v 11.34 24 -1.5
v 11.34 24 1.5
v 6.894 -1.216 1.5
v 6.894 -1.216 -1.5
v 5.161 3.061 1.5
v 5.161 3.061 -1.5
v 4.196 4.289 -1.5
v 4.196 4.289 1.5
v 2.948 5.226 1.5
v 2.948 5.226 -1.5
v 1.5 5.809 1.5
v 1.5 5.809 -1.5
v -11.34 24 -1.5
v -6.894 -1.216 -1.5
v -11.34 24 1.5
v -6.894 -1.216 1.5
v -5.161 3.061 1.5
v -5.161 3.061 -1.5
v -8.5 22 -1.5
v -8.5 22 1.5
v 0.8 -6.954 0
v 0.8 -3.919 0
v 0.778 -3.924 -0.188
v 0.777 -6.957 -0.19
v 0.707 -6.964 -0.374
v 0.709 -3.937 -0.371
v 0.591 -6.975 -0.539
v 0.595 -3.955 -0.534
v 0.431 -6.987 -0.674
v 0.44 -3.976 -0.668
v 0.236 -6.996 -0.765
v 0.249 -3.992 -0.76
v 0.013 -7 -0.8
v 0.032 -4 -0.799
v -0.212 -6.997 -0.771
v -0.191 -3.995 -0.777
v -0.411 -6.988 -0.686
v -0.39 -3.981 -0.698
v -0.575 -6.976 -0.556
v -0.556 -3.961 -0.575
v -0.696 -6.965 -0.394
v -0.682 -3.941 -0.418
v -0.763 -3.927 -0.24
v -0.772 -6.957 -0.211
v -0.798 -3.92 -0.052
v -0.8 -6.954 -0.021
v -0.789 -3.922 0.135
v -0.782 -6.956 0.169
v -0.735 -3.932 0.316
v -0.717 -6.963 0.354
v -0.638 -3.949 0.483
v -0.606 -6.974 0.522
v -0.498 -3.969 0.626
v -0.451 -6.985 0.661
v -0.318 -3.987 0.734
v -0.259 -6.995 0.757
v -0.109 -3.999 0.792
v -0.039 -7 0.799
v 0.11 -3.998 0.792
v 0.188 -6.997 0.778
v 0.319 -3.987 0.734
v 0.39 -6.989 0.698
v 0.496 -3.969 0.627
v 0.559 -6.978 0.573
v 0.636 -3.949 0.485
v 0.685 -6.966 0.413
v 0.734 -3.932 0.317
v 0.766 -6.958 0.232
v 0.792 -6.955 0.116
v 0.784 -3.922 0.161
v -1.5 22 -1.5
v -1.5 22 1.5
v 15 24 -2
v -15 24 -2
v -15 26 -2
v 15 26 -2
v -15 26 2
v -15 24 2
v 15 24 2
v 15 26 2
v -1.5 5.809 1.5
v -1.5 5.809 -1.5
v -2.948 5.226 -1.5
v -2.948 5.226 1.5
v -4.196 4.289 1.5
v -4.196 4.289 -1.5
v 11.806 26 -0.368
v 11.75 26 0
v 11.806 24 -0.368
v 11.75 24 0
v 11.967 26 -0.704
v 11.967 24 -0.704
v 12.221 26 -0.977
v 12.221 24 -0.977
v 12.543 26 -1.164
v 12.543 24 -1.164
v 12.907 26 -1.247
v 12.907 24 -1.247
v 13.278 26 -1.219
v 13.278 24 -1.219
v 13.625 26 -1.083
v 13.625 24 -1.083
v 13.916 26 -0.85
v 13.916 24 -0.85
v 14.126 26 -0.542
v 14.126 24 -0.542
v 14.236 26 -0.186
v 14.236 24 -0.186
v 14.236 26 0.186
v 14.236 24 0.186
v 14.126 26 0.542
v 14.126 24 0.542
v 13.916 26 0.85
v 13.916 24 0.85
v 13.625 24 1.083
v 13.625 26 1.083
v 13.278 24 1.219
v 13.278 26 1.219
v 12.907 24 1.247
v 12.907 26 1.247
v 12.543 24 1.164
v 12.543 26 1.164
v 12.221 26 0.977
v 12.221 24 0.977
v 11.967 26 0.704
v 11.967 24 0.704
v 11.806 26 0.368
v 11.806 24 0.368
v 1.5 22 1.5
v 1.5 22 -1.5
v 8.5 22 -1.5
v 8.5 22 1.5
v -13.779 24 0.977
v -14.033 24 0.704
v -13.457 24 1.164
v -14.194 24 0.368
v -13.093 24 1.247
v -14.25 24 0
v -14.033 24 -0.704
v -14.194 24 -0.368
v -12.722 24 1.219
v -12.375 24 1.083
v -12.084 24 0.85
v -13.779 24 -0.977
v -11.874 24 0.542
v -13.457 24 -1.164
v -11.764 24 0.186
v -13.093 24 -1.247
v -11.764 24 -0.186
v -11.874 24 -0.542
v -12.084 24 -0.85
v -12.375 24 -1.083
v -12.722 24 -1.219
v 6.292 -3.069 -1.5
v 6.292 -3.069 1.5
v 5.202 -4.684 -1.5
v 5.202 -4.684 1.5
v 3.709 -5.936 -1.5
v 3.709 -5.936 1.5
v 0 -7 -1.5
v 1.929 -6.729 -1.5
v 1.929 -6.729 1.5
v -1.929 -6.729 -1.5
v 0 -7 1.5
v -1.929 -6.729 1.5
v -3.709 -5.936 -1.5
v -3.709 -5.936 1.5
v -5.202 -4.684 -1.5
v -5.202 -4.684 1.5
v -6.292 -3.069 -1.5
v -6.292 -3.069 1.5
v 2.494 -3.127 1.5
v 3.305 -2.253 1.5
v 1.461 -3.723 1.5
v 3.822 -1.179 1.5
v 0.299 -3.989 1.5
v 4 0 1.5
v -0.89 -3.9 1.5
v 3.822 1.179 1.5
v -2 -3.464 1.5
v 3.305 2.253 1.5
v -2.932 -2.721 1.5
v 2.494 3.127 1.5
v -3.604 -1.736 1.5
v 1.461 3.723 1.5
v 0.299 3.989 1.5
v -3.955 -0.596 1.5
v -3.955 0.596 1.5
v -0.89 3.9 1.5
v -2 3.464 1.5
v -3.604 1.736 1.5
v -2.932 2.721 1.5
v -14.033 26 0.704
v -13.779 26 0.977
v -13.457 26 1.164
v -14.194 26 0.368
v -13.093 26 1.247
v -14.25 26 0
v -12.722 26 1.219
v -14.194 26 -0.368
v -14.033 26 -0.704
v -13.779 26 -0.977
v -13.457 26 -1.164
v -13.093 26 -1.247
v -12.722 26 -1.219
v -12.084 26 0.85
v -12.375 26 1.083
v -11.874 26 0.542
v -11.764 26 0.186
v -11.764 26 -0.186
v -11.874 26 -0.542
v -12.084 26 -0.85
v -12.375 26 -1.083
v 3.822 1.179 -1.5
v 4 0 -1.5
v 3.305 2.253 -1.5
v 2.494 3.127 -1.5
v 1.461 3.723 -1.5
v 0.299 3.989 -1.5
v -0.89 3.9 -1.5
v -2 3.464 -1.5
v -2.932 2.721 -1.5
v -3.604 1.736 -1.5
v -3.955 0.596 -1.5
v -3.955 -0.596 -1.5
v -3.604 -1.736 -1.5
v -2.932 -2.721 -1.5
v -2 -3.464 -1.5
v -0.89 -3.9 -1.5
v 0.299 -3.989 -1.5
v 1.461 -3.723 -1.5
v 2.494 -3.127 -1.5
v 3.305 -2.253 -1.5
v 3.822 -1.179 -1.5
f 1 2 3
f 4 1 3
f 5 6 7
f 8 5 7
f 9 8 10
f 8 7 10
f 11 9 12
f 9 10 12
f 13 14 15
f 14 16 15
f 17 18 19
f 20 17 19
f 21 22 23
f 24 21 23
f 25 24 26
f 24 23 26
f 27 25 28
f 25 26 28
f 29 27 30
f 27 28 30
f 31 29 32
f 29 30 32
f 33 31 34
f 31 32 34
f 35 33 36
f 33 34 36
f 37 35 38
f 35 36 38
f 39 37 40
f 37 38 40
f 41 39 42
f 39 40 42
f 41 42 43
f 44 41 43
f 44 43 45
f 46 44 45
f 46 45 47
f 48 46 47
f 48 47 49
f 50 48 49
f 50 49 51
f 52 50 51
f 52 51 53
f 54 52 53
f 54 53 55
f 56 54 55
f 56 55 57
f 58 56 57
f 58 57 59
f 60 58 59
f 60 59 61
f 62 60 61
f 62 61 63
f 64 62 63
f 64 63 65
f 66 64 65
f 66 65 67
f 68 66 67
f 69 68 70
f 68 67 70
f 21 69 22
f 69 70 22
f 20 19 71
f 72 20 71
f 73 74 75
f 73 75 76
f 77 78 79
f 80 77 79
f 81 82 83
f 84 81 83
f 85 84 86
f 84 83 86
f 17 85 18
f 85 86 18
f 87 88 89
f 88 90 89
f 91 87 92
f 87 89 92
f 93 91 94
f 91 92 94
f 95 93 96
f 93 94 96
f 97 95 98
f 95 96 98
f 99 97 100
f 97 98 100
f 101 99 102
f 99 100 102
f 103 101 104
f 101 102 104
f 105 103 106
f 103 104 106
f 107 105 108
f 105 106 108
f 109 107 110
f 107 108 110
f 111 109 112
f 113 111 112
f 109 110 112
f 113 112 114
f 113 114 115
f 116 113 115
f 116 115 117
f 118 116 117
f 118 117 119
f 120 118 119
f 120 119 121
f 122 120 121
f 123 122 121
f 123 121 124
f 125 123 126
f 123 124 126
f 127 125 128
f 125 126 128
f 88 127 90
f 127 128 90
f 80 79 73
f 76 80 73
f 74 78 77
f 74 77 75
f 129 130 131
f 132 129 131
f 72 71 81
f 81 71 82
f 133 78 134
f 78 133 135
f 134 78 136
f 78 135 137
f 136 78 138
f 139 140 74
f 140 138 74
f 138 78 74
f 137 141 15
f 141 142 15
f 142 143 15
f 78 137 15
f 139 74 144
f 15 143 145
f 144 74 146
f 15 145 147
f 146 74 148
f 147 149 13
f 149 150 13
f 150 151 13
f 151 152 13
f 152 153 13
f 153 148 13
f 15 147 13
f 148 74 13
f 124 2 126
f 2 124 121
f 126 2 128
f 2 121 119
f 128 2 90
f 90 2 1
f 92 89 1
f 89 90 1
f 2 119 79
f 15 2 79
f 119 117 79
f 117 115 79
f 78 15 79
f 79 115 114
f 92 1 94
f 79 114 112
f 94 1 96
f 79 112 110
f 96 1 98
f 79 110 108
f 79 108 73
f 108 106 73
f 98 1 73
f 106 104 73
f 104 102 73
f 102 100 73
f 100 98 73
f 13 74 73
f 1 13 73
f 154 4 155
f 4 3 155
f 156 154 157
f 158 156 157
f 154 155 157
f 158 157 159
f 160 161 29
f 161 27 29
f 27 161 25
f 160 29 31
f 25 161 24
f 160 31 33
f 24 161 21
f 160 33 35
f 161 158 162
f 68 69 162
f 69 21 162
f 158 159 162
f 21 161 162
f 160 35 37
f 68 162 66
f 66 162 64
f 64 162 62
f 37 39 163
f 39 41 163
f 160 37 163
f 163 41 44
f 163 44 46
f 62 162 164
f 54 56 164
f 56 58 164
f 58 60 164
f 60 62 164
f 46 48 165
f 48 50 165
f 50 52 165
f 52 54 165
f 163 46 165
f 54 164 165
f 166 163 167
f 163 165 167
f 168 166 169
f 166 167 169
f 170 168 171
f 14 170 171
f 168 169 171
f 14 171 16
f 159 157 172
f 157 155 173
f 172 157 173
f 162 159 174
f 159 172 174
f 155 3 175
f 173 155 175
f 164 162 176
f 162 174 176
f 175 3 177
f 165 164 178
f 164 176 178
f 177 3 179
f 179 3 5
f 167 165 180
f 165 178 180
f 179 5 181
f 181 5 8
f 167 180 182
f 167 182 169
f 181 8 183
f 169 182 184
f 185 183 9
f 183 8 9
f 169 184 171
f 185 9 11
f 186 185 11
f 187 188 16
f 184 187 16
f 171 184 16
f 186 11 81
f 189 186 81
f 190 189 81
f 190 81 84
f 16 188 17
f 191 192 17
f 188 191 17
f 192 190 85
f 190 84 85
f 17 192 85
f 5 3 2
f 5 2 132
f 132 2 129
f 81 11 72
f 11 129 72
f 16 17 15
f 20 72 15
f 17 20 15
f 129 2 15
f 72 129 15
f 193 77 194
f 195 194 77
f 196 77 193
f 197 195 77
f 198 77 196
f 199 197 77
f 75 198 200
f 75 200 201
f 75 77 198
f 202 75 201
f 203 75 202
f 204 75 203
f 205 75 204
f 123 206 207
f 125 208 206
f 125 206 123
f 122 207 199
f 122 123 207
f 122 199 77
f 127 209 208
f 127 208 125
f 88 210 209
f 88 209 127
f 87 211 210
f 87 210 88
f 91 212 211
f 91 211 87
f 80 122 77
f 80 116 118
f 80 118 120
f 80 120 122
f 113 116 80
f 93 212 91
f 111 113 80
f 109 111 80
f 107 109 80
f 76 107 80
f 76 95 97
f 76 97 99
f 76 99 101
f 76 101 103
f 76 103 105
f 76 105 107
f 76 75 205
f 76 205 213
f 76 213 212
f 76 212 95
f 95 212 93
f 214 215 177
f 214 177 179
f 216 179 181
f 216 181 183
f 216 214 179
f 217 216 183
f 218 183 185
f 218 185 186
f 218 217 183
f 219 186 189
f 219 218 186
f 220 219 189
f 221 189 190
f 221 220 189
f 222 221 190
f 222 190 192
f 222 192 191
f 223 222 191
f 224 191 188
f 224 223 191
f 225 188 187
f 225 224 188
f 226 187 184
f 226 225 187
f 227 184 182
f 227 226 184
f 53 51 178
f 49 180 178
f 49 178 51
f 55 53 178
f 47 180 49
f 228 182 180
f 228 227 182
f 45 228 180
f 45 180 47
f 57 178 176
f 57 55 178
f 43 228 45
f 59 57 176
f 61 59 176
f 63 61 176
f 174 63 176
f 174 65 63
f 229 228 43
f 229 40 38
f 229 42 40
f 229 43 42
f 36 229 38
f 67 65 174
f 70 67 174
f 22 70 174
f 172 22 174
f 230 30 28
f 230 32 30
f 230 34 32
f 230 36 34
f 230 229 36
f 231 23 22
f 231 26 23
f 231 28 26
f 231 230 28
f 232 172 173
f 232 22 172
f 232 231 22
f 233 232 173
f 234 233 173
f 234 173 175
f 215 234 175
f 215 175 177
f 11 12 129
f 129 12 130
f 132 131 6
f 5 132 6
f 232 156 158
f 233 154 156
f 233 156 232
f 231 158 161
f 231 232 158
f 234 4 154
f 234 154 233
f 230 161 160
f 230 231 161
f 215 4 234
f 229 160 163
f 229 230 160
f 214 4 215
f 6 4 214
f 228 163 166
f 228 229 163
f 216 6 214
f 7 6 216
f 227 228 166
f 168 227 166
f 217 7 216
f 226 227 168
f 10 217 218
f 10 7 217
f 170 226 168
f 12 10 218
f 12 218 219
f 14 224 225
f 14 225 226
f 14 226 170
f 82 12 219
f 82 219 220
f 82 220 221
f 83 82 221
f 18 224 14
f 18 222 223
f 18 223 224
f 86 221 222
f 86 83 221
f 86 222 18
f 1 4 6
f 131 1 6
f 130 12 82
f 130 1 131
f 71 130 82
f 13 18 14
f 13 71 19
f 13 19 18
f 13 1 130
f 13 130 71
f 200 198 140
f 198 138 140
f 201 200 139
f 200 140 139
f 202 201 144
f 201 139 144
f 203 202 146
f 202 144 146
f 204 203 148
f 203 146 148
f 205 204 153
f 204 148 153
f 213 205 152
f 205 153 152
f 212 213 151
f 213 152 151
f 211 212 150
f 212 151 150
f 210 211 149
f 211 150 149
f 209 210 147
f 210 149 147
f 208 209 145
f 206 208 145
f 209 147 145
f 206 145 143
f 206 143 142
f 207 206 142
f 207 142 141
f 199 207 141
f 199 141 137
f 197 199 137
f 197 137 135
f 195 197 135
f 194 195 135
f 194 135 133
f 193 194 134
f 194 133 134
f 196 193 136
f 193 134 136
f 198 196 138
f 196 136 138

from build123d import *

# Parameters (mm, degrees)
SKETCH_1_R             = 4
EXTRUDE_1_DEPTH        = 1.5
SKETCH_2_W             = 30
SKETCH_2_H             = 4
EXTRUDE_2_DEPTH        = 2
HOLE_WIZARD_M3_1_D     = 2.5
HOLE_WIZARD_M3_1_DEPTH = 2
HOLE_WIZARD_M3_1_TIP   = 0.751075774
CUT_EXTRUDE_2_DEPTH    = 10
HOLE_WIZARD_M2_1_D     = 1.6
HOLE_WIZARD_M2_1_DEPTH = 4.2
HOLE_WIZARD_M2_1_TIP   = 0.480688495


with BuildPart() as part:
    # 草图1 → 凸台-拉伸1 (new, symmetric)
    with BuildSketch(Plane.XY):
        with BuildLine():
            Line((11.33983382, 24), (6.893654271, -1.215537244))
            ThreePointArc((6.893654271, -1.215537244), (0, -7), (-6.893654271, -1.215537244))
            Line((-6.893654271, -1.215537244), (-11.33983382, 24))
            Line((-11.33983382, 24), (11.33983382, 24))
        make_face()
        Circle(SKETCH_1_R, mode=Mode.SUBTRACT)
    extrude(amount=EXTRUDE_1_DEPTH, both=True)

    # 草图2 → 凸台-拉伸2 (add)
    with BuildSketch(Plane(origin=(0, 24, 0), x_dir=(1, 0, 0), z_dir=(0, 1, 0))):
        Rectangle(SKETCH_2_W, SKETCH_2_H)
    extrude(amount=EXTRUDE_2_DEPTH)

    # M3 螺纹孔1
    with Locations(Plane(origin=(0, 26, 0), x_dir=(1, 0, 0), z_dir=(0, 1, 0))):
        with Locations((-13, 0), (13, 0)):
            Hole(HOLE_WIZARD_M3_1_D / 2, depth=HOLE_WIZARD_M3_1_DEPTH)
            with Locations((0, 0, -(HOLE_WIZARD_M3_1_DEPTH + HOLE_WIZARD_M3_1_TIP / 2))):  # 118° drill point
                Cone(0, HOLE_WIZARD_M3_1_D / 2, HOLE_WIZARD_M3_1_TIP, mode=Mode.SUBTRACT)

    # 草图8 → 切除-拉伸2 (cut)
    with BuildSketch(Plane(origin=(0, 0, -1.5), x_dir=(-1, 0, 0), z_dir=(0, 0, -1))):
        with BuildLine():
            Line((-1.5, 22), (-8.5, 22))
            Line((-8.5, 22), (-5.160522702, 3.060883114))
            ThreePointArc((-5.160522702, 3.060883114), (-3.602683726, 4.797986033), (-1.5, 5.809475019))
            Line((-1.5, 5.809475019), (-1.5, 22))
        make_face()
        with BuildLine():
            Line((8.5, 22), (1.5, 22))
            Line((1.5, 22), (1.5, 5.809475019))
            ThreePointArc((1.5, 5.809475019), (3.602683726, 4.797986033), (5.160522702, 3.060883114))
            Line((5.160522702, 3.060883114), (8.5, 22))
        make_face()
    extrude(amount=-CUT_EXTRUDE_2_DEPTH, mode=Mode.SUBTRACT)

    # M2 螺纹孔1
    with Locations(Plane(origin=(0, -7, 0), x_dir=(-1, 0, 0), z_dir=(0, -1, 0))):
        with Locations((0, 0)):
            Hole(HOLE_WIZARD_M2_1_D / 2, depth=HOLE_WIZARD_M2_1_DEPTH)
            with Locations((0, 0, -(HOLE_WIZARD_M2_1_DEPTH + HOLE_WIZARD_M2_1_TIP / 2))):  # 118° drill point
                Cone(0, HOLE_WIZARD_M2_1_D / 2, HOLE_WIZARD_M2_1_TIP, mode=Mode.SUBTRACT)


solid = part.part
